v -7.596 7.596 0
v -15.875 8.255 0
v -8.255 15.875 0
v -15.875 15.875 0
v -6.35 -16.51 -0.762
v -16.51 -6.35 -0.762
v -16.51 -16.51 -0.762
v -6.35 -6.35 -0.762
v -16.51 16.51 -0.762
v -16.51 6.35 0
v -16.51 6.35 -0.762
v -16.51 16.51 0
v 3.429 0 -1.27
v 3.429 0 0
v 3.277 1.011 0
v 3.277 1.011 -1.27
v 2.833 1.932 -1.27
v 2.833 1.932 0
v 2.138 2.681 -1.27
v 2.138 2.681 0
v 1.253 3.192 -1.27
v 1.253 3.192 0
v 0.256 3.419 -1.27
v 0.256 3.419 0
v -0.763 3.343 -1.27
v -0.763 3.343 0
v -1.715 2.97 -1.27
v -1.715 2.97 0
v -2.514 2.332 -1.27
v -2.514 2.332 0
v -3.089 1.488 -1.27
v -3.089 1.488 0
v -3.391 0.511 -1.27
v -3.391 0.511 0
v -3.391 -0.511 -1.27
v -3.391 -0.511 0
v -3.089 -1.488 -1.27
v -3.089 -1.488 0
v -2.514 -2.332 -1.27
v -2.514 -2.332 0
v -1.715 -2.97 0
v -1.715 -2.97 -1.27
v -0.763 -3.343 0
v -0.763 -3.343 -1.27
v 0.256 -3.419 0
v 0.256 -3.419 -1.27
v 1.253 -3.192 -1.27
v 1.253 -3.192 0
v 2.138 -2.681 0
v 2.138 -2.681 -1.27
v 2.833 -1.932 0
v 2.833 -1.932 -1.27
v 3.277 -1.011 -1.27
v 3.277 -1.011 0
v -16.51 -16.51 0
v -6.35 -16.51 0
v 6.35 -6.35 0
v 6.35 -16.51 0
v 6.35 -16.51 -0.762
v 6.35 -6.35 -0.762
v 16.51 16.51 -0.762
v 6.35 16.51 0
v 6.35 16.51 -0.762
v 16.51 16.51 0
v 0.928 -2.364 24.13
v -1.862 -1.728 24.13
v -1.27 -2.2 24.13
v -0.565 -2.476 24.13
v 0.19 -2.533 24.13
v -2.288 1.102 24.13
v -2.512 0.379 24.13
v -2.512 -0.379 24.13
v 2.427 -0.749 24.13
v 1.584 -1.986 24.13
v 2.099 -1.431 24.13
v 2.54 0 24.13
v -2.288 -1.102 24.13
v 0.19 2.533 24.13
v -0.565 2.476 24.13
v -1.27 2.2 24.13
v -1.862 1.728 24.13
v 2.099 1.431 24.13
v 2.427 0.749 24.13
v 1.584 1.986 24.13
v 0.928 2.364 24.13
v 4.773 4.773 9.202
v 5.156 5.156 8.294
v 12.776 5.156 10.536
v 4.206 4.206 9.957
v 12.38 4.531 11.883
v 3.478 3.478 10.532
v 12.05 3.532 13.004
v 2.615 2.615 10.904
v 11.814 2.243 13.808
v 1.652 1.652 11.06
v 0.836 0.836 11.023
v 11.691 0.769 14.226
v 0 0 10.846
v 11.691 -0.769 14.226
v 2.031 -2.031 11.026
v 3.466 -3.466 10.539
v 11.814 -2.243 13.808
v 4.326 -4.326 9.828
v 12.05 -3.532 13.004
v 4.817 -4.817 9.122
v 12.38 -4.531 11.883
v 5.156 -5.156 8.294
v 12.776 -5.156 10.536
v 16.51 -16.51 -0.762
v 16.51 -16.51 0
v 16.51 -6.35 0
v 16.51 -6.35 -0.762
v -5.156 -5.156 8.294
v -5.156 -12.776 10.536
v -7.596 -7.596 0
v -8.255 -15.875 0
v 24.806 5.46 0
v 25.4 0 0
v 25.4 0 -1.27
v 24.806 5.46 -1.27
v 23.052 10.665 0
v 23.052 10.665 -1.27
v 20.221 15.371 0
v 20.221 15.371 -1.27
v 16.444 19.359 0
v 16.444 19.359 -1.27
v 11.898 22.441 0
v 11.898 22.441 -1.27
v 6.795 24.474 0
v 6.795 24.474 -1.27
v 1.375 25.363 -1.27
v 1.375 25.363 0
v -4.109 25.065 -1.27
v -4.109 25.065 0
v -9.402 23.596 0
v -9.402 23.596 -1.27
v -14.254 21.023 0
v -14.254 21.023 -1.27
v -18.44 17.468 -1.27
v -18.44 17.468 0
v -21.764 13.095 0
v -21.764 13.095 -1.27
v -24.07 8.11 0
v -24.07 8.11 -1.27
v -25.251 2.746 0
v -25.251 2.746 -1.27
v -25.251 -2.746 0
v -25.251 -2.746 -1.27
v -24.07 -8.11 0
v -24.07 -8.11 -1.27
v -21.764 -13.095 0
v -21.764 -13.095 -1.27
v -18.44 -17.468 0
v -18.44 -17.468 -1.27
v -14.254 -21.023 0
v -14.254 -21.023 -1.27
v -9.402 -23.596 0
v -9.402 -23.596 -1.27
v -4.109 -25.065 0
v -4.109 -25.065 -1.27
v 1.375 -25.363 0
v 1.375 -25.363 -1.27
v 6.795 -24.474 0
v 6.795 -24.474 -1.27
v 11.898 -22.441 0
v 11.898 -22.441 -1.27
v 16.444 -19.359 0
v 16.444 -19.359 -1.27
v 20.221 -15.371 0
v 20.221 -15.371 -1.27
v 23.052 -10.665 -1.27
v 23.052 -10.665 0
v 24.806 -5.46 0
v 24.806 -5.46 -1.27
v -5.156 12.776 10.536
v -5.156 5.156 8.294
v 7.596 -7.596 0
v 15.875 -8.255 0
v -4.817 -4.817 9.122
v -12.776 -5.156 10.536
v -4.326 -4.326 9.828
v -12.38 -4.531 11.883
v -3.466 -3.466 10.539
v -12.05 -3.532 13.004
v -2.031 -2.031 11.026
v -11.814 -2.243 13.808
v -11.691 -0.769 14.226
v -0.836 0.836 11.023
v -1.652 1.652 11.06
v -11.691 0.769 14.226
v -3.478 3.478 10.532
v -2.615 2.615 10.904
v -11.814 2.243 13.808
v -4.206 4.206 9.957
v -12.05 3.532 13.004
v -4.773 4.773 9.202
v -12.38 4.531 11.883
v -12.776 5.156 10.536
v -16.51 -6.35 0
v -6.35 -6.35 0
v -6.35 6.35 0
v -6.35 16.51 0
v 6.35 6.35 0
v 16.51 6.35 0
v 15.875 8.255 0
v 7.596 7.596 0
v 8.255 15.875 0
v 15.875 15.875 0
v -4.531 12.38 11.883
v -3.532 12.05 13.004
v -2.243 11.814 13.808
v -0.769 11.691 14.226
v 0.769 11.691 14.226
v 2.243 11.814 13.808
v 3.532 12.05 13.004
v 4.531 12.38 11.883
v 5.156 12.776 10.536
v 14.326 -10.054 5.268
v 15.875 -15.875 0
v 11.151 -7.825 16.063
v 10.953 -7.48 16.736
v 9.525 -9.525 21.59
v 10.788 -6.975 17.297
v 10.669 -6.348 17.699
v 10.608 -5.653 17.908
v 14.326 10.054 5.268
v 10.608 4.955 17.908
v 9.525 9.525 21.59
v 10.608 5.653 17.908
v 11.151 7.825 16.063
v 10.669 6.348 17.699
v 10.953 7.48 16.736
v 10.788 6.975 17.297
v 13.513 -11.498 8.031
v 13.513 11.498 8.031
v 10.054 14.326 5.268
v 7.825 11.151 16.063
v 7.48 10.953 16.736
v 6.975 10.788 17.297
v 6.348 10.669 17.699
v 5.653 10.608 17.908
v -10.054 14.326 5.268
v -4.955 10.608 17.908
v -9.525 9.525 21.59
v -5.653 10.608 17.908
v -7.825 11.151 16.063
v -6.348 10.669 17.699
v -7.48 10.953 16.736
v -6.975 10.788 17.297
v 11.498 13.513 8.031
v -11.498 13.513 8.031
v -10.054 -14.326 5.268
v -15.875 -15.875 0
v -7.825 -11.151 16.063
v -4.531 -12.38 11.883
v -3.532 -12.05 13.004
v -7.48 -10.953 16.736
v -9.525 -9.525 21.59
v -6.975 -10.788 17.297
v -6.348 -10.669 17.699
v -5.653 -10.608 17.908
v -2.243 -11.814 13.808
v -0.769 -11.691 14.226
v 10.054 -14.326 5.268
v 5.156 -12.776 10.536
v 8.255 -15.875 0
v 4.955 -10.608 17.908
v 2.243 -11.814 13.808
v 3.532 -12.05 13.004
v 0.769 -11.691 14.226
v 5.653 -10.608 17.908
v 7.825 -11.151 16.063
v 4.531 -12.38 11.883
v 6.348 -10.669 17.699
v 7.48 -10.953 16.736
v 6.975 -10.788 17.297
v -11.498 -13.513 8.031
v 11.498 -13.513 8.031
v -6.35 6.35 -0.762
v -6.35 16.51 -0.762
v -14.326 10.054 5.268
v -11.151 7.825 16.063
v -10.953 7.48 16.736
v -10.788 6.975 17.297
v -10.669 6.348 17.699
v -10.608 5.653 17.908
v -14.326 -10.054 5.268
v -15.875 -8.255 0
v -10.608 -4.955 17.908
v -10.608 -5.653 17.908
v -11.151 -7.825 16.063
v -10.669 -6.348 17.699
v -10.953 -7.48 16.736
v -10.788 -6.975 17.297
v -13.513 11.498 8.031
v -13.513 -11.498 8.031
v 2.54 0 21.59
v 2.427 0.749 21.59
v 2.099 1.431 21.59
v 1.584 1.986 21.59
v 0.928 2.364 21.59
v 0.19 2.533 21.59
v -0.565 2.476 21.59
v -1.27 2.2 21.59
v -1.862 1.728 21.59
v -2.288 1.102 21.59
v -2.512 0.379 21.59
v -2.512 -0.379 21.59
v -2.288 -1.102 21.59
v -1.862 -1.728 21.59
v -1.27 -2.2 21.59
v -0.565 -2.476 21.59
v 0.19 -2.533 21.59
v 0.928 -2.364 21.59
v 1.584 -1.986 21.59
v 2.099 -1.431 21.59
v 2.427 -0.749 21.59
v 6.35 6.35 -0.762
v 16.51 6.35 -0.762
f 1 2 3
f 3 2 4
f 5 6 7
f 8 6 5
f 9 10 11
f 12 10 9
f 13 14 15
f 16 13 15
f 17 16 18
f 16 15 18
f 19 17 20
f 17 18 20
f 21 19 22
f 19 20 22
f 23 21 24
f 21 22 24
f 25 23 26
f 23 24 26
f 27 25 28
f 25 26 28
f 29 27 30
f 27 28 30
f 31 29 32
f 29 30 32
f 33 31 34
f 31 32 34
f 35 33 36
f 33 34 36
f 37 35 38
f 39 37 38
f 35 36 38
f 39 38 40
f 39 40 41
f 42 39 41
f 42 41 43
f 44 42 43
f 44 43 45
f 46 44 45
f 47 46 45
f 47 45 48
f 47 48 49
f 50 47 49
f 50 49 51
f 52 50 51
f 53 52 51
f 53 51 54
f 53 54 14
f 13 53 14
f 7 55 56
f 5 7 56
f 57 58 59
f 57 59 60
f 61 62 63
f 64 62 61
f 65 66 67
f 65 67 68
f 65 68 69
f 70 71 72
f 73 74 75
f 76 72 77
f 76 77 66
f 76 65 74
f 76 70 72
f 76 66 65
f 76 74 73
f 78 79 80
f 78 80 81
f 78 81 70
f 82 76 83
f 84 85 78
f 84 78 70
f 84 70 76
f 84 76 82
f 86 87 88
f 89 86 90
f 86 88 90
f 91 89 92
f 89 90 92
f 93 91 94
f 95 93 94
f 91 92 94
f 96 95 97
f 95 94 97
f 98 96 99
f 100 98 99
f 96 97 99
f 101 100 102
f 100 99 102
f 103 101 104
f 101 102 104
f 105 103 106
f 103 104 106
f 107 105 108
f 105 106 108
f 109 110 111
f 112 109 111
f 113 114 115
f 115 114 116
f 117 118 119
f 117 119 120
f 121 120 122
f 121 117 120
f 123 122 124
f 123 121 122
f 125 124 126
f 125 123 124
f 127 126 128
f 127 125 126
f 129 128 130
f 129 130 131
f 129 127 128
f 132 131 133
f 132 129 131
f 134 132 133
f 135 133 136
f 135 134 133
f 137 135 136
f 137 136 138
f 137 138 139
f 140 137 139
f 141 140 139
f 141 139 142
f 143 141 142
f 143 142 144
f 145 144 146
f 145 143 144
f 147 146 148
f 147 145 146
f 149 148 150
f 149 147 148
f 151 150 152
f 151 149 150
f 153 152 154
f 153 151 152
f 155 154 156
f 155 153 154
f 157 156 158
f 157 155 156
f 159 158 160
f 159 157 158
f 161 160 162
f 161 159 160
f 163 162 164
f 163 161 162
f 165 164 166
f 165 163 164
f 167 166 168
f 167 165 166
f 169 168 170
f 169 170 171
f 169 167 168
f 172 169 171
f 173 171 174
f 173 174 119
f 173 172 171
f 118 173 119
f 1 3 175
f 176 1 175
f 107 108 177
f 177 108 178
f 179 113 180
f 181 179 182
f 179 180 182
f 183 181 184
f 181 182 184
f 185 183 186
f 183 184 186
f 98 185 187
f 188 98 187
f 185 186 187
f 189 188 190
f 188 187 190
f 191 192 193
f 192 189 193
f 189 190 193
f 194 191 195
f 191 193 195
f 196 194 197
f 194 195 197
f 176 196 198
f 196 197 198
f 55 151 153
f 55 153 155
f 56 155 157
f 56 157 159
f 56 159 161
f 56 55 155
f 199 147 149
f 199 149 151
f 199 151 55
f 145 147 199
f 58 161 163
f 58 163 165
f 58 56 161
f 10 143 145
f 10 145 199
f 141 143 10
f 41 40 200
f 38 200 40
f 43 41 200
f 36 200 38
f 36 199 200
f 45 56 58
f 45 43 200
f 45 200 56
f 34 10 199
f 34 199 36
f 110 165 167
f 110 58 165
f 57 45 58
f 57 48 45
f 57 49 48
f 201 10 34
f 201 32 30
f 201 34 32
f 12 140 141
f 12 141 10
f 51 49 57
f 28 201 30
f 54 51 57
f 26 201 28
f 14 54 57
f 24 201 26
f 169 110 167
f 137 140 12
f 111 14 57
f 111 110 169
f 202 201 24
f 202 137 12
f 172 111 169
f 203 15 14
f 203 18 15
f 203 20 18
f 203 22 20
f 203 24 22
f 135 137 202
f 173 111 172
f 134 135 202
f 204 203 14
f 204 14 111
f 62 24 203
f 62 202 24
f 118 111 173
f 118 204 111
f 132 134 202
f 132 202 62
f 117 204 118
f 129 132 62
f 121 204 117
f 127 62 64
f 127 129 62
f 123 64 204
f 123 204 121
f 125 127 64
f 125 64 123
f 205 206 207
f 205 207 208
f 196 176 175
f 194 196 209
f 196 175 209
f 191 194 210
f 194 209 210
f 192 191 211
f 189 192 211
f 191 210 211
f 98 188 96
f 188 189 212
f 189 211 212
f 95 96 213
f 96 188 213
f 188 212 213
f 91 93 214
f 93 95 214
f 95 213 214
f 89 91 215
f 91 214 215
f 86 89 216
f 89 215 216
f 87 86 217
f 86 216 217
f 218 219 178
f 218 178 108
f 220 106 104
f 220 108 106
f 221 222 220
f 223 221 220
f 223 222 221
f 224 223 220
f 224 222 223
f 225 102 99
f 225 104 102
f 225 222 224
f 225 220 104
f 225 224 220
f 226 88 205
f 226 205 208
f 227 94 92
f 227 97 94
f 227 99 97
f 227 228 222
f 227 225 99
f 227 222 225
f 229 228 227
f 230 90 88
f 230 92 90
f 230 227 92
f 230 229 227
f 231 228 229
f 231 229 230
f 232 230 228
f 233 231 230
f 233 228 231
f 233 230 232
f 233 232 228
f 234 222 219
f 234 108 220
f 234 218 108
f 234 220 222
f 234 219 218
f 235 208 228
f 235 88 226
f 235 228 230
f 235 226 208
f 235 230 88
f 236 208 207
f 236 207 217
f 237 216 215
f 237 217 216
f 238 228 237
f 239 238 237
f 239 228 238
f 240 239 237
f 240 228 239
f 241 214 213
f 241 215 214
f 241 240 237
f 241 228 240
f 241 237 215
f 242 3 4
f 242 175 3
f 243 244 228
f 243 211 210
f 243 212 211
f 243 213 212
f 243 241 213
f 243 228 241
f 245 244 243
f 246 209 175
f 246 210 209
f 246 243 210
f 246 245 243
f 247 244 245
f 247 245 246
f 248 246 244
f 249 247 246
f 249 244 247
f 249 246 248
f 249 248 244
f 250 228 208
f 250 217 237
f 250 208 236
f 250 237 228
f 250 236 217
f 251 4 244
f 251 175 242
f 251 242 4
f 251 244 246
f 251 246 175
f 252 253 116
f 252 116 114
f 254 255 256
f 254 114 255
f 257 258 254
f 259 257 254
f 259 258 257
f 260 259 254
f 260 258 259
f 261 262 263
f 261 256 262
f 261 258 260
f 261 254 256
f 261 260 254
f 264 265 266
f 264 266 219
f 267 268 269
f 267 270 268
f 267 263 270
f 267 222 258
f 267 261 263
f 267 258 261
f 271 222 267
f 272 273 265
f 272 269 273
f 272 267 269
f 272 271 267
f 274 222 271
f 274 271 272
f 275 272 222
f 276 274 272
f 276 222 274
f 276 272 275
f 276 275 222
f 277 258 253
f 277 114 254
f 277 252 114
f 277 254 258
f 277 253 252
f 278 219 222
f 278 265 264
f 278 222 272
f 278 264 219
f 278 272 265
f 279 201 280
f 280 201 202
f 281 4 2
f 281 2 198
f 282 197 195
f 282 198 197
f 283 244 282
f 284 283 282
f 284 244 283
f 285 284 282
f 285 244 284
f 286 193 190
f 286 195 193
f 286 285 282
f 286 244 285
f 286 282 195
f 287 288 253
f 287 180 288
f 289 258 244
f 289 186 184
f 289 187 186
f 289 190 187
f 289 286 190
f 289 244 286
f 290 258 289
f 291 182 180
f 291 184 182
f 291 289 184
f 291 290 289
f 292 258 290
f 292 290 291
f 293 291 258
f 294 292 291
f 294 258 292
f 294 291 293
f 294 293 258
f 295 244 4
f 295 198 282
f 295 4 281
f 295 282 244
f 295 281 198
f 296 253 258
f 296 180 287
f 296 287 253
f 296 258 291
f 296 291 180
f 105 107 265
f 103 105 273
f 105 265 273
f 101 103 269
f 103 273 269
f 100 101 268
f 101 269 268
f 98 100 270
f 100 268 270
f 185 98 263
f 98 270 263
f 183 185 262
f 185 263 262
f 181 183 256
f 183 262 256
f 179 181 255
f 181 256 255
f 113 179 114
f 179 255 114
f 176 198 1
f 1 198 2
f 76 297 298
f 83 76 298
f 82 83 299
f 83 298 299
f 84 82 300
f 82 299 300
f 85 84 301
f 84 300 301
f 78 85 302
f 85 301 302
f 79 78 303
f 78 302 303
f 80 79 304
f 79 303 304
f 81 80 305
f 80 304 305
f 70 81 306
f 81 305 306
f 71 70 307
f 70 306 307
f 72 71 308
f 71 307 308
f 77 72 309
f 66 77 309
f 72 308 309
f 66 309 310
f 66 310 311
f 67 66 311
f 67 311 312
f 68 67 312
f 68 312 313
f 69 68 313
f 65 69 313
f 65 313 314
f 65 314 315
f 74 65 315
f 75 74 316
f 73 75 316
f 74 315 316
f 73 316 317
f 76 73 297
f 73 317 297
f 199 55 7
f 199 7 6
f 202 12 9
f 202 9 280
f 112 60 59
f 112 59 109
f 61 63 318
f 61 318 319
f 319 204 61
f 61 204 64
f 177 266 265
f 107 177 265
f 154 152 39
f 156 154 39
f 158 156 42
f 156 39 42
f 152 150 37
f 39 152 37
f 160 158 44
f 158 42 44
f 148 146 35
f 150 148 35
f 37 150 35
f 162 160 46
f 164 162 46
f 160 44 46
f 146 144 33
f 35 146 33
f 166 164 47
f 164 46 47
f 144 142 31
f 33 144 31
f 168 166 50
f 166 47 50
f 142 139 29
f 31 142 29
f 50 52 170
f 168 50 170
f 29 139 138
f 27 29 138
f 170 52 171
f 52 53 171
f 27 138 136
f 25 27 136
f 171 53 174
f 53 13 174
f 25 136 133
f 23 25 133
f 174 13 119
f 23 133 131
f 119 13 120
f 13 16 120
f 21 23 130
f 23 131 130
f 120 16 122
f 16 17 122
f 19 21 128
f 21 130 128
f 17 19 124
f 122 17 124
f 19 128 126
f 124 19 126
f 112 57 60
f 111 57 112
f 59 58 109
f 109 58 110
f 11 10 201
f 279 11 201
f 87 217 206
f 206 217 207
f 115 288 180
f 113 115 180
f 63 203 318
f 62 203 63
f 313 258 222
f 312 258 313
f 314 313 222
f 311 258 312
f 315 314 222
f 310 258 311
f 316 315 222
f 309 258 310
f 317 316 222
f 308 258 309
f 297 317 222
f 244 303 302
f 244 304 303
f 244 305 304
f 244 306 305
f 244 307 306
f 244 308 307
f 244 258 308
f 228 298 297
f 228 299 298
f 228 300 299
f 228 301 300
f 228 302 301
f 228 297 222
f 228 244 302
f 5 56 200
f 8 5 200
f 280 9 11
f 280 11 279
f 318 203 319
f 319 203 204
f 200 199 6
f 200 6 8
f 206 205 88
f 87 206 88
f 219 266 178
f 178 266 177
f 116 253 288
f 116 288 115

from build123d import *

# Parameters (mm, degrees)
F0_R      = 25.4
F1_DEPTH  = 1.27
F2_W      = 31.75
F2_H      = 31.75
F4_W      = 19.05
F4_H      = 19.05
F10_DEPTH = 74.422
F11_DEPTH = 67.7926
F12_DEPTH = 25.4
F13_DEPTH = 25.4
F14_W     = 10.16
F14_H     = 10.16
F15_DEPTH = 0.762
F16_R     = 2.54
F17_DEPTH = 2.54
F18_R     = 3.429
F19_DEPTH = 25.4


with BuildPart() as f1:
    # F0 (on Top) → F1 (new body)
    with BuildSketch(Plane.XY):
        Circle(F0_R)
    extrude(amount=-F1_DEPTH)

    # F14 (on face) → F15 (cut)
    with BuildSketch(Plane.XY):
        with Locations((11.43, 11.43)):
            Rectangle(F14_W, F14_H)
        with Locations((11.43, -11.43)):
            Rectangle(F14_W, F14_H)
        with Locations((-11.43, 11.43)):
            Rectangle(F14_W, F14_H)
        with Locations((-11.43, -11.43)):
            Rectangle(F14_W, F14_H)
    extrude(amount=-F15_DEPTH, mode=Mode.SUBTRACT)

    # F18 (on face) → F19 (cut)
    with BuildSketch(Plane.XY):
        Circle(F18_R)
    extrude(amount=-F19_DEPTH, mode=Mode.SUBTRACT)


with BuildPart() as f5:
    # F2 (on Top) → F5 section 0
    with BuildSketch(Plane.XY):
        Rectangle(F2_W, F2_H)
    # F4 (on offset) → F5 section 1
    with BuildSketch(Plane.XY.offset(21.59)):
        Rectangle(F4_W, F4_H)
    loft()

    # F9 (on face) → F10 (cut)
    with BuildSketch(Plane(origin=(14.611066879, 0, 4.2973726115), x_dir=(0, 1, 0), z_dir=(0.9593655016, 0, 0.282166324))):
        with BuildLine():
            Line((-8.255, -4.4793903934), (8.255, -4.4793903934))
            Line((8.255, -4.4793903934), (5.1563233946, 6.5023474752))
            ThreePointArc((5.1563233946, 6.5023474752), (0, 10.4050669429), (-5.1563233946, 6.5023474752))
            Line((-5.1563233946, 6.5023474752), (-8.255, -4.4793903934))
        make_face()
    extrude(amount=-F10_DEPTH, mode=Mode.SUBTRACT)

    # F6 (on face) → F11 (cut)
    with BuildSketch(Plane(origin=(0, -14.611066879, 4.2973726115), x_dir=(1, 0, 0), z_dir=(0, -0.9593655016, 0.282166324))):
        with BuildLine():
            Line((-8.255, -4.4793903934), (8.255, -4.4793903934))
            Line((8.255, -4.4793903934), (5.1563233946, 6.5023474752))
            ThreePointArc((5.1563233946, 6.5023474752), (0, 10.4050669429), (-5.1563233946, 6.5023474752))
            Line((-5.1563233946, 6.5023474752), (-8.255, -4.4793903934))
        make_face()
    extrude(amount=-F11_DEPTH, mode=Mode.SUBTRACT)

    # F7 (on face) → F12 (cut)
    with BuildSketch(Plane(origin=(0, 14.611066879, 4.2973726115), x_dir=(-1, 0, 0), z_dir=(0, 0.9593655016, 0.282166324))):
        with BuildLine():
            Line((-8.255, -4.4793903934), (8.255, -4.4793903934))
            Line((8.255, -4.4793903934), (5.1563233946, 6.5023474752))
            ThreePointArc((5.1563233946, 6.5023474752), (0, 10.4050669429), (-5.1563233946, 6.5023474752))
            Line((-5.1563233946, 6.5023474752), (-8.255, -4.4793903934))
        make_face()
    extrude(amount=-F12_DEPTH, mode=Mode.SUBTRACT)

    # F8 (on face) → F13 (cut)
    with BuildSketch(Plane(origin=(-14.611066879, 0, 4.2973726115), x_dir=(0, -1, 0), z_dir=(-0.9593655016, 0, 0.282166324))):
        with BuildLine():
            Line((-5.1563233946, 6.5023474752), (-8.255, -4.4793903934))
            Line((-8.255, -4.4793903934), (8.255, -4.4793903934))
            Line((8.255, -4.4793903934), (5.1563233946, 6.5023474752))
            ThreePointArc((5.1563233946, 6.5023474752), (0, 10.4050669429), (-5.1563233946, 6.5023474752))
        make_face()
    extrude(amount=-F13_DEPTH, mode=Mode.SUBTRACT)

    # F16 (on face) → F17 (join)
    with BuildSketch(Plane.XY.offset(21.59)):
        Circle(F16_R)
    extrude(amount=F17_DEPTH)


solid = Compound([f1.part, f5.part])
